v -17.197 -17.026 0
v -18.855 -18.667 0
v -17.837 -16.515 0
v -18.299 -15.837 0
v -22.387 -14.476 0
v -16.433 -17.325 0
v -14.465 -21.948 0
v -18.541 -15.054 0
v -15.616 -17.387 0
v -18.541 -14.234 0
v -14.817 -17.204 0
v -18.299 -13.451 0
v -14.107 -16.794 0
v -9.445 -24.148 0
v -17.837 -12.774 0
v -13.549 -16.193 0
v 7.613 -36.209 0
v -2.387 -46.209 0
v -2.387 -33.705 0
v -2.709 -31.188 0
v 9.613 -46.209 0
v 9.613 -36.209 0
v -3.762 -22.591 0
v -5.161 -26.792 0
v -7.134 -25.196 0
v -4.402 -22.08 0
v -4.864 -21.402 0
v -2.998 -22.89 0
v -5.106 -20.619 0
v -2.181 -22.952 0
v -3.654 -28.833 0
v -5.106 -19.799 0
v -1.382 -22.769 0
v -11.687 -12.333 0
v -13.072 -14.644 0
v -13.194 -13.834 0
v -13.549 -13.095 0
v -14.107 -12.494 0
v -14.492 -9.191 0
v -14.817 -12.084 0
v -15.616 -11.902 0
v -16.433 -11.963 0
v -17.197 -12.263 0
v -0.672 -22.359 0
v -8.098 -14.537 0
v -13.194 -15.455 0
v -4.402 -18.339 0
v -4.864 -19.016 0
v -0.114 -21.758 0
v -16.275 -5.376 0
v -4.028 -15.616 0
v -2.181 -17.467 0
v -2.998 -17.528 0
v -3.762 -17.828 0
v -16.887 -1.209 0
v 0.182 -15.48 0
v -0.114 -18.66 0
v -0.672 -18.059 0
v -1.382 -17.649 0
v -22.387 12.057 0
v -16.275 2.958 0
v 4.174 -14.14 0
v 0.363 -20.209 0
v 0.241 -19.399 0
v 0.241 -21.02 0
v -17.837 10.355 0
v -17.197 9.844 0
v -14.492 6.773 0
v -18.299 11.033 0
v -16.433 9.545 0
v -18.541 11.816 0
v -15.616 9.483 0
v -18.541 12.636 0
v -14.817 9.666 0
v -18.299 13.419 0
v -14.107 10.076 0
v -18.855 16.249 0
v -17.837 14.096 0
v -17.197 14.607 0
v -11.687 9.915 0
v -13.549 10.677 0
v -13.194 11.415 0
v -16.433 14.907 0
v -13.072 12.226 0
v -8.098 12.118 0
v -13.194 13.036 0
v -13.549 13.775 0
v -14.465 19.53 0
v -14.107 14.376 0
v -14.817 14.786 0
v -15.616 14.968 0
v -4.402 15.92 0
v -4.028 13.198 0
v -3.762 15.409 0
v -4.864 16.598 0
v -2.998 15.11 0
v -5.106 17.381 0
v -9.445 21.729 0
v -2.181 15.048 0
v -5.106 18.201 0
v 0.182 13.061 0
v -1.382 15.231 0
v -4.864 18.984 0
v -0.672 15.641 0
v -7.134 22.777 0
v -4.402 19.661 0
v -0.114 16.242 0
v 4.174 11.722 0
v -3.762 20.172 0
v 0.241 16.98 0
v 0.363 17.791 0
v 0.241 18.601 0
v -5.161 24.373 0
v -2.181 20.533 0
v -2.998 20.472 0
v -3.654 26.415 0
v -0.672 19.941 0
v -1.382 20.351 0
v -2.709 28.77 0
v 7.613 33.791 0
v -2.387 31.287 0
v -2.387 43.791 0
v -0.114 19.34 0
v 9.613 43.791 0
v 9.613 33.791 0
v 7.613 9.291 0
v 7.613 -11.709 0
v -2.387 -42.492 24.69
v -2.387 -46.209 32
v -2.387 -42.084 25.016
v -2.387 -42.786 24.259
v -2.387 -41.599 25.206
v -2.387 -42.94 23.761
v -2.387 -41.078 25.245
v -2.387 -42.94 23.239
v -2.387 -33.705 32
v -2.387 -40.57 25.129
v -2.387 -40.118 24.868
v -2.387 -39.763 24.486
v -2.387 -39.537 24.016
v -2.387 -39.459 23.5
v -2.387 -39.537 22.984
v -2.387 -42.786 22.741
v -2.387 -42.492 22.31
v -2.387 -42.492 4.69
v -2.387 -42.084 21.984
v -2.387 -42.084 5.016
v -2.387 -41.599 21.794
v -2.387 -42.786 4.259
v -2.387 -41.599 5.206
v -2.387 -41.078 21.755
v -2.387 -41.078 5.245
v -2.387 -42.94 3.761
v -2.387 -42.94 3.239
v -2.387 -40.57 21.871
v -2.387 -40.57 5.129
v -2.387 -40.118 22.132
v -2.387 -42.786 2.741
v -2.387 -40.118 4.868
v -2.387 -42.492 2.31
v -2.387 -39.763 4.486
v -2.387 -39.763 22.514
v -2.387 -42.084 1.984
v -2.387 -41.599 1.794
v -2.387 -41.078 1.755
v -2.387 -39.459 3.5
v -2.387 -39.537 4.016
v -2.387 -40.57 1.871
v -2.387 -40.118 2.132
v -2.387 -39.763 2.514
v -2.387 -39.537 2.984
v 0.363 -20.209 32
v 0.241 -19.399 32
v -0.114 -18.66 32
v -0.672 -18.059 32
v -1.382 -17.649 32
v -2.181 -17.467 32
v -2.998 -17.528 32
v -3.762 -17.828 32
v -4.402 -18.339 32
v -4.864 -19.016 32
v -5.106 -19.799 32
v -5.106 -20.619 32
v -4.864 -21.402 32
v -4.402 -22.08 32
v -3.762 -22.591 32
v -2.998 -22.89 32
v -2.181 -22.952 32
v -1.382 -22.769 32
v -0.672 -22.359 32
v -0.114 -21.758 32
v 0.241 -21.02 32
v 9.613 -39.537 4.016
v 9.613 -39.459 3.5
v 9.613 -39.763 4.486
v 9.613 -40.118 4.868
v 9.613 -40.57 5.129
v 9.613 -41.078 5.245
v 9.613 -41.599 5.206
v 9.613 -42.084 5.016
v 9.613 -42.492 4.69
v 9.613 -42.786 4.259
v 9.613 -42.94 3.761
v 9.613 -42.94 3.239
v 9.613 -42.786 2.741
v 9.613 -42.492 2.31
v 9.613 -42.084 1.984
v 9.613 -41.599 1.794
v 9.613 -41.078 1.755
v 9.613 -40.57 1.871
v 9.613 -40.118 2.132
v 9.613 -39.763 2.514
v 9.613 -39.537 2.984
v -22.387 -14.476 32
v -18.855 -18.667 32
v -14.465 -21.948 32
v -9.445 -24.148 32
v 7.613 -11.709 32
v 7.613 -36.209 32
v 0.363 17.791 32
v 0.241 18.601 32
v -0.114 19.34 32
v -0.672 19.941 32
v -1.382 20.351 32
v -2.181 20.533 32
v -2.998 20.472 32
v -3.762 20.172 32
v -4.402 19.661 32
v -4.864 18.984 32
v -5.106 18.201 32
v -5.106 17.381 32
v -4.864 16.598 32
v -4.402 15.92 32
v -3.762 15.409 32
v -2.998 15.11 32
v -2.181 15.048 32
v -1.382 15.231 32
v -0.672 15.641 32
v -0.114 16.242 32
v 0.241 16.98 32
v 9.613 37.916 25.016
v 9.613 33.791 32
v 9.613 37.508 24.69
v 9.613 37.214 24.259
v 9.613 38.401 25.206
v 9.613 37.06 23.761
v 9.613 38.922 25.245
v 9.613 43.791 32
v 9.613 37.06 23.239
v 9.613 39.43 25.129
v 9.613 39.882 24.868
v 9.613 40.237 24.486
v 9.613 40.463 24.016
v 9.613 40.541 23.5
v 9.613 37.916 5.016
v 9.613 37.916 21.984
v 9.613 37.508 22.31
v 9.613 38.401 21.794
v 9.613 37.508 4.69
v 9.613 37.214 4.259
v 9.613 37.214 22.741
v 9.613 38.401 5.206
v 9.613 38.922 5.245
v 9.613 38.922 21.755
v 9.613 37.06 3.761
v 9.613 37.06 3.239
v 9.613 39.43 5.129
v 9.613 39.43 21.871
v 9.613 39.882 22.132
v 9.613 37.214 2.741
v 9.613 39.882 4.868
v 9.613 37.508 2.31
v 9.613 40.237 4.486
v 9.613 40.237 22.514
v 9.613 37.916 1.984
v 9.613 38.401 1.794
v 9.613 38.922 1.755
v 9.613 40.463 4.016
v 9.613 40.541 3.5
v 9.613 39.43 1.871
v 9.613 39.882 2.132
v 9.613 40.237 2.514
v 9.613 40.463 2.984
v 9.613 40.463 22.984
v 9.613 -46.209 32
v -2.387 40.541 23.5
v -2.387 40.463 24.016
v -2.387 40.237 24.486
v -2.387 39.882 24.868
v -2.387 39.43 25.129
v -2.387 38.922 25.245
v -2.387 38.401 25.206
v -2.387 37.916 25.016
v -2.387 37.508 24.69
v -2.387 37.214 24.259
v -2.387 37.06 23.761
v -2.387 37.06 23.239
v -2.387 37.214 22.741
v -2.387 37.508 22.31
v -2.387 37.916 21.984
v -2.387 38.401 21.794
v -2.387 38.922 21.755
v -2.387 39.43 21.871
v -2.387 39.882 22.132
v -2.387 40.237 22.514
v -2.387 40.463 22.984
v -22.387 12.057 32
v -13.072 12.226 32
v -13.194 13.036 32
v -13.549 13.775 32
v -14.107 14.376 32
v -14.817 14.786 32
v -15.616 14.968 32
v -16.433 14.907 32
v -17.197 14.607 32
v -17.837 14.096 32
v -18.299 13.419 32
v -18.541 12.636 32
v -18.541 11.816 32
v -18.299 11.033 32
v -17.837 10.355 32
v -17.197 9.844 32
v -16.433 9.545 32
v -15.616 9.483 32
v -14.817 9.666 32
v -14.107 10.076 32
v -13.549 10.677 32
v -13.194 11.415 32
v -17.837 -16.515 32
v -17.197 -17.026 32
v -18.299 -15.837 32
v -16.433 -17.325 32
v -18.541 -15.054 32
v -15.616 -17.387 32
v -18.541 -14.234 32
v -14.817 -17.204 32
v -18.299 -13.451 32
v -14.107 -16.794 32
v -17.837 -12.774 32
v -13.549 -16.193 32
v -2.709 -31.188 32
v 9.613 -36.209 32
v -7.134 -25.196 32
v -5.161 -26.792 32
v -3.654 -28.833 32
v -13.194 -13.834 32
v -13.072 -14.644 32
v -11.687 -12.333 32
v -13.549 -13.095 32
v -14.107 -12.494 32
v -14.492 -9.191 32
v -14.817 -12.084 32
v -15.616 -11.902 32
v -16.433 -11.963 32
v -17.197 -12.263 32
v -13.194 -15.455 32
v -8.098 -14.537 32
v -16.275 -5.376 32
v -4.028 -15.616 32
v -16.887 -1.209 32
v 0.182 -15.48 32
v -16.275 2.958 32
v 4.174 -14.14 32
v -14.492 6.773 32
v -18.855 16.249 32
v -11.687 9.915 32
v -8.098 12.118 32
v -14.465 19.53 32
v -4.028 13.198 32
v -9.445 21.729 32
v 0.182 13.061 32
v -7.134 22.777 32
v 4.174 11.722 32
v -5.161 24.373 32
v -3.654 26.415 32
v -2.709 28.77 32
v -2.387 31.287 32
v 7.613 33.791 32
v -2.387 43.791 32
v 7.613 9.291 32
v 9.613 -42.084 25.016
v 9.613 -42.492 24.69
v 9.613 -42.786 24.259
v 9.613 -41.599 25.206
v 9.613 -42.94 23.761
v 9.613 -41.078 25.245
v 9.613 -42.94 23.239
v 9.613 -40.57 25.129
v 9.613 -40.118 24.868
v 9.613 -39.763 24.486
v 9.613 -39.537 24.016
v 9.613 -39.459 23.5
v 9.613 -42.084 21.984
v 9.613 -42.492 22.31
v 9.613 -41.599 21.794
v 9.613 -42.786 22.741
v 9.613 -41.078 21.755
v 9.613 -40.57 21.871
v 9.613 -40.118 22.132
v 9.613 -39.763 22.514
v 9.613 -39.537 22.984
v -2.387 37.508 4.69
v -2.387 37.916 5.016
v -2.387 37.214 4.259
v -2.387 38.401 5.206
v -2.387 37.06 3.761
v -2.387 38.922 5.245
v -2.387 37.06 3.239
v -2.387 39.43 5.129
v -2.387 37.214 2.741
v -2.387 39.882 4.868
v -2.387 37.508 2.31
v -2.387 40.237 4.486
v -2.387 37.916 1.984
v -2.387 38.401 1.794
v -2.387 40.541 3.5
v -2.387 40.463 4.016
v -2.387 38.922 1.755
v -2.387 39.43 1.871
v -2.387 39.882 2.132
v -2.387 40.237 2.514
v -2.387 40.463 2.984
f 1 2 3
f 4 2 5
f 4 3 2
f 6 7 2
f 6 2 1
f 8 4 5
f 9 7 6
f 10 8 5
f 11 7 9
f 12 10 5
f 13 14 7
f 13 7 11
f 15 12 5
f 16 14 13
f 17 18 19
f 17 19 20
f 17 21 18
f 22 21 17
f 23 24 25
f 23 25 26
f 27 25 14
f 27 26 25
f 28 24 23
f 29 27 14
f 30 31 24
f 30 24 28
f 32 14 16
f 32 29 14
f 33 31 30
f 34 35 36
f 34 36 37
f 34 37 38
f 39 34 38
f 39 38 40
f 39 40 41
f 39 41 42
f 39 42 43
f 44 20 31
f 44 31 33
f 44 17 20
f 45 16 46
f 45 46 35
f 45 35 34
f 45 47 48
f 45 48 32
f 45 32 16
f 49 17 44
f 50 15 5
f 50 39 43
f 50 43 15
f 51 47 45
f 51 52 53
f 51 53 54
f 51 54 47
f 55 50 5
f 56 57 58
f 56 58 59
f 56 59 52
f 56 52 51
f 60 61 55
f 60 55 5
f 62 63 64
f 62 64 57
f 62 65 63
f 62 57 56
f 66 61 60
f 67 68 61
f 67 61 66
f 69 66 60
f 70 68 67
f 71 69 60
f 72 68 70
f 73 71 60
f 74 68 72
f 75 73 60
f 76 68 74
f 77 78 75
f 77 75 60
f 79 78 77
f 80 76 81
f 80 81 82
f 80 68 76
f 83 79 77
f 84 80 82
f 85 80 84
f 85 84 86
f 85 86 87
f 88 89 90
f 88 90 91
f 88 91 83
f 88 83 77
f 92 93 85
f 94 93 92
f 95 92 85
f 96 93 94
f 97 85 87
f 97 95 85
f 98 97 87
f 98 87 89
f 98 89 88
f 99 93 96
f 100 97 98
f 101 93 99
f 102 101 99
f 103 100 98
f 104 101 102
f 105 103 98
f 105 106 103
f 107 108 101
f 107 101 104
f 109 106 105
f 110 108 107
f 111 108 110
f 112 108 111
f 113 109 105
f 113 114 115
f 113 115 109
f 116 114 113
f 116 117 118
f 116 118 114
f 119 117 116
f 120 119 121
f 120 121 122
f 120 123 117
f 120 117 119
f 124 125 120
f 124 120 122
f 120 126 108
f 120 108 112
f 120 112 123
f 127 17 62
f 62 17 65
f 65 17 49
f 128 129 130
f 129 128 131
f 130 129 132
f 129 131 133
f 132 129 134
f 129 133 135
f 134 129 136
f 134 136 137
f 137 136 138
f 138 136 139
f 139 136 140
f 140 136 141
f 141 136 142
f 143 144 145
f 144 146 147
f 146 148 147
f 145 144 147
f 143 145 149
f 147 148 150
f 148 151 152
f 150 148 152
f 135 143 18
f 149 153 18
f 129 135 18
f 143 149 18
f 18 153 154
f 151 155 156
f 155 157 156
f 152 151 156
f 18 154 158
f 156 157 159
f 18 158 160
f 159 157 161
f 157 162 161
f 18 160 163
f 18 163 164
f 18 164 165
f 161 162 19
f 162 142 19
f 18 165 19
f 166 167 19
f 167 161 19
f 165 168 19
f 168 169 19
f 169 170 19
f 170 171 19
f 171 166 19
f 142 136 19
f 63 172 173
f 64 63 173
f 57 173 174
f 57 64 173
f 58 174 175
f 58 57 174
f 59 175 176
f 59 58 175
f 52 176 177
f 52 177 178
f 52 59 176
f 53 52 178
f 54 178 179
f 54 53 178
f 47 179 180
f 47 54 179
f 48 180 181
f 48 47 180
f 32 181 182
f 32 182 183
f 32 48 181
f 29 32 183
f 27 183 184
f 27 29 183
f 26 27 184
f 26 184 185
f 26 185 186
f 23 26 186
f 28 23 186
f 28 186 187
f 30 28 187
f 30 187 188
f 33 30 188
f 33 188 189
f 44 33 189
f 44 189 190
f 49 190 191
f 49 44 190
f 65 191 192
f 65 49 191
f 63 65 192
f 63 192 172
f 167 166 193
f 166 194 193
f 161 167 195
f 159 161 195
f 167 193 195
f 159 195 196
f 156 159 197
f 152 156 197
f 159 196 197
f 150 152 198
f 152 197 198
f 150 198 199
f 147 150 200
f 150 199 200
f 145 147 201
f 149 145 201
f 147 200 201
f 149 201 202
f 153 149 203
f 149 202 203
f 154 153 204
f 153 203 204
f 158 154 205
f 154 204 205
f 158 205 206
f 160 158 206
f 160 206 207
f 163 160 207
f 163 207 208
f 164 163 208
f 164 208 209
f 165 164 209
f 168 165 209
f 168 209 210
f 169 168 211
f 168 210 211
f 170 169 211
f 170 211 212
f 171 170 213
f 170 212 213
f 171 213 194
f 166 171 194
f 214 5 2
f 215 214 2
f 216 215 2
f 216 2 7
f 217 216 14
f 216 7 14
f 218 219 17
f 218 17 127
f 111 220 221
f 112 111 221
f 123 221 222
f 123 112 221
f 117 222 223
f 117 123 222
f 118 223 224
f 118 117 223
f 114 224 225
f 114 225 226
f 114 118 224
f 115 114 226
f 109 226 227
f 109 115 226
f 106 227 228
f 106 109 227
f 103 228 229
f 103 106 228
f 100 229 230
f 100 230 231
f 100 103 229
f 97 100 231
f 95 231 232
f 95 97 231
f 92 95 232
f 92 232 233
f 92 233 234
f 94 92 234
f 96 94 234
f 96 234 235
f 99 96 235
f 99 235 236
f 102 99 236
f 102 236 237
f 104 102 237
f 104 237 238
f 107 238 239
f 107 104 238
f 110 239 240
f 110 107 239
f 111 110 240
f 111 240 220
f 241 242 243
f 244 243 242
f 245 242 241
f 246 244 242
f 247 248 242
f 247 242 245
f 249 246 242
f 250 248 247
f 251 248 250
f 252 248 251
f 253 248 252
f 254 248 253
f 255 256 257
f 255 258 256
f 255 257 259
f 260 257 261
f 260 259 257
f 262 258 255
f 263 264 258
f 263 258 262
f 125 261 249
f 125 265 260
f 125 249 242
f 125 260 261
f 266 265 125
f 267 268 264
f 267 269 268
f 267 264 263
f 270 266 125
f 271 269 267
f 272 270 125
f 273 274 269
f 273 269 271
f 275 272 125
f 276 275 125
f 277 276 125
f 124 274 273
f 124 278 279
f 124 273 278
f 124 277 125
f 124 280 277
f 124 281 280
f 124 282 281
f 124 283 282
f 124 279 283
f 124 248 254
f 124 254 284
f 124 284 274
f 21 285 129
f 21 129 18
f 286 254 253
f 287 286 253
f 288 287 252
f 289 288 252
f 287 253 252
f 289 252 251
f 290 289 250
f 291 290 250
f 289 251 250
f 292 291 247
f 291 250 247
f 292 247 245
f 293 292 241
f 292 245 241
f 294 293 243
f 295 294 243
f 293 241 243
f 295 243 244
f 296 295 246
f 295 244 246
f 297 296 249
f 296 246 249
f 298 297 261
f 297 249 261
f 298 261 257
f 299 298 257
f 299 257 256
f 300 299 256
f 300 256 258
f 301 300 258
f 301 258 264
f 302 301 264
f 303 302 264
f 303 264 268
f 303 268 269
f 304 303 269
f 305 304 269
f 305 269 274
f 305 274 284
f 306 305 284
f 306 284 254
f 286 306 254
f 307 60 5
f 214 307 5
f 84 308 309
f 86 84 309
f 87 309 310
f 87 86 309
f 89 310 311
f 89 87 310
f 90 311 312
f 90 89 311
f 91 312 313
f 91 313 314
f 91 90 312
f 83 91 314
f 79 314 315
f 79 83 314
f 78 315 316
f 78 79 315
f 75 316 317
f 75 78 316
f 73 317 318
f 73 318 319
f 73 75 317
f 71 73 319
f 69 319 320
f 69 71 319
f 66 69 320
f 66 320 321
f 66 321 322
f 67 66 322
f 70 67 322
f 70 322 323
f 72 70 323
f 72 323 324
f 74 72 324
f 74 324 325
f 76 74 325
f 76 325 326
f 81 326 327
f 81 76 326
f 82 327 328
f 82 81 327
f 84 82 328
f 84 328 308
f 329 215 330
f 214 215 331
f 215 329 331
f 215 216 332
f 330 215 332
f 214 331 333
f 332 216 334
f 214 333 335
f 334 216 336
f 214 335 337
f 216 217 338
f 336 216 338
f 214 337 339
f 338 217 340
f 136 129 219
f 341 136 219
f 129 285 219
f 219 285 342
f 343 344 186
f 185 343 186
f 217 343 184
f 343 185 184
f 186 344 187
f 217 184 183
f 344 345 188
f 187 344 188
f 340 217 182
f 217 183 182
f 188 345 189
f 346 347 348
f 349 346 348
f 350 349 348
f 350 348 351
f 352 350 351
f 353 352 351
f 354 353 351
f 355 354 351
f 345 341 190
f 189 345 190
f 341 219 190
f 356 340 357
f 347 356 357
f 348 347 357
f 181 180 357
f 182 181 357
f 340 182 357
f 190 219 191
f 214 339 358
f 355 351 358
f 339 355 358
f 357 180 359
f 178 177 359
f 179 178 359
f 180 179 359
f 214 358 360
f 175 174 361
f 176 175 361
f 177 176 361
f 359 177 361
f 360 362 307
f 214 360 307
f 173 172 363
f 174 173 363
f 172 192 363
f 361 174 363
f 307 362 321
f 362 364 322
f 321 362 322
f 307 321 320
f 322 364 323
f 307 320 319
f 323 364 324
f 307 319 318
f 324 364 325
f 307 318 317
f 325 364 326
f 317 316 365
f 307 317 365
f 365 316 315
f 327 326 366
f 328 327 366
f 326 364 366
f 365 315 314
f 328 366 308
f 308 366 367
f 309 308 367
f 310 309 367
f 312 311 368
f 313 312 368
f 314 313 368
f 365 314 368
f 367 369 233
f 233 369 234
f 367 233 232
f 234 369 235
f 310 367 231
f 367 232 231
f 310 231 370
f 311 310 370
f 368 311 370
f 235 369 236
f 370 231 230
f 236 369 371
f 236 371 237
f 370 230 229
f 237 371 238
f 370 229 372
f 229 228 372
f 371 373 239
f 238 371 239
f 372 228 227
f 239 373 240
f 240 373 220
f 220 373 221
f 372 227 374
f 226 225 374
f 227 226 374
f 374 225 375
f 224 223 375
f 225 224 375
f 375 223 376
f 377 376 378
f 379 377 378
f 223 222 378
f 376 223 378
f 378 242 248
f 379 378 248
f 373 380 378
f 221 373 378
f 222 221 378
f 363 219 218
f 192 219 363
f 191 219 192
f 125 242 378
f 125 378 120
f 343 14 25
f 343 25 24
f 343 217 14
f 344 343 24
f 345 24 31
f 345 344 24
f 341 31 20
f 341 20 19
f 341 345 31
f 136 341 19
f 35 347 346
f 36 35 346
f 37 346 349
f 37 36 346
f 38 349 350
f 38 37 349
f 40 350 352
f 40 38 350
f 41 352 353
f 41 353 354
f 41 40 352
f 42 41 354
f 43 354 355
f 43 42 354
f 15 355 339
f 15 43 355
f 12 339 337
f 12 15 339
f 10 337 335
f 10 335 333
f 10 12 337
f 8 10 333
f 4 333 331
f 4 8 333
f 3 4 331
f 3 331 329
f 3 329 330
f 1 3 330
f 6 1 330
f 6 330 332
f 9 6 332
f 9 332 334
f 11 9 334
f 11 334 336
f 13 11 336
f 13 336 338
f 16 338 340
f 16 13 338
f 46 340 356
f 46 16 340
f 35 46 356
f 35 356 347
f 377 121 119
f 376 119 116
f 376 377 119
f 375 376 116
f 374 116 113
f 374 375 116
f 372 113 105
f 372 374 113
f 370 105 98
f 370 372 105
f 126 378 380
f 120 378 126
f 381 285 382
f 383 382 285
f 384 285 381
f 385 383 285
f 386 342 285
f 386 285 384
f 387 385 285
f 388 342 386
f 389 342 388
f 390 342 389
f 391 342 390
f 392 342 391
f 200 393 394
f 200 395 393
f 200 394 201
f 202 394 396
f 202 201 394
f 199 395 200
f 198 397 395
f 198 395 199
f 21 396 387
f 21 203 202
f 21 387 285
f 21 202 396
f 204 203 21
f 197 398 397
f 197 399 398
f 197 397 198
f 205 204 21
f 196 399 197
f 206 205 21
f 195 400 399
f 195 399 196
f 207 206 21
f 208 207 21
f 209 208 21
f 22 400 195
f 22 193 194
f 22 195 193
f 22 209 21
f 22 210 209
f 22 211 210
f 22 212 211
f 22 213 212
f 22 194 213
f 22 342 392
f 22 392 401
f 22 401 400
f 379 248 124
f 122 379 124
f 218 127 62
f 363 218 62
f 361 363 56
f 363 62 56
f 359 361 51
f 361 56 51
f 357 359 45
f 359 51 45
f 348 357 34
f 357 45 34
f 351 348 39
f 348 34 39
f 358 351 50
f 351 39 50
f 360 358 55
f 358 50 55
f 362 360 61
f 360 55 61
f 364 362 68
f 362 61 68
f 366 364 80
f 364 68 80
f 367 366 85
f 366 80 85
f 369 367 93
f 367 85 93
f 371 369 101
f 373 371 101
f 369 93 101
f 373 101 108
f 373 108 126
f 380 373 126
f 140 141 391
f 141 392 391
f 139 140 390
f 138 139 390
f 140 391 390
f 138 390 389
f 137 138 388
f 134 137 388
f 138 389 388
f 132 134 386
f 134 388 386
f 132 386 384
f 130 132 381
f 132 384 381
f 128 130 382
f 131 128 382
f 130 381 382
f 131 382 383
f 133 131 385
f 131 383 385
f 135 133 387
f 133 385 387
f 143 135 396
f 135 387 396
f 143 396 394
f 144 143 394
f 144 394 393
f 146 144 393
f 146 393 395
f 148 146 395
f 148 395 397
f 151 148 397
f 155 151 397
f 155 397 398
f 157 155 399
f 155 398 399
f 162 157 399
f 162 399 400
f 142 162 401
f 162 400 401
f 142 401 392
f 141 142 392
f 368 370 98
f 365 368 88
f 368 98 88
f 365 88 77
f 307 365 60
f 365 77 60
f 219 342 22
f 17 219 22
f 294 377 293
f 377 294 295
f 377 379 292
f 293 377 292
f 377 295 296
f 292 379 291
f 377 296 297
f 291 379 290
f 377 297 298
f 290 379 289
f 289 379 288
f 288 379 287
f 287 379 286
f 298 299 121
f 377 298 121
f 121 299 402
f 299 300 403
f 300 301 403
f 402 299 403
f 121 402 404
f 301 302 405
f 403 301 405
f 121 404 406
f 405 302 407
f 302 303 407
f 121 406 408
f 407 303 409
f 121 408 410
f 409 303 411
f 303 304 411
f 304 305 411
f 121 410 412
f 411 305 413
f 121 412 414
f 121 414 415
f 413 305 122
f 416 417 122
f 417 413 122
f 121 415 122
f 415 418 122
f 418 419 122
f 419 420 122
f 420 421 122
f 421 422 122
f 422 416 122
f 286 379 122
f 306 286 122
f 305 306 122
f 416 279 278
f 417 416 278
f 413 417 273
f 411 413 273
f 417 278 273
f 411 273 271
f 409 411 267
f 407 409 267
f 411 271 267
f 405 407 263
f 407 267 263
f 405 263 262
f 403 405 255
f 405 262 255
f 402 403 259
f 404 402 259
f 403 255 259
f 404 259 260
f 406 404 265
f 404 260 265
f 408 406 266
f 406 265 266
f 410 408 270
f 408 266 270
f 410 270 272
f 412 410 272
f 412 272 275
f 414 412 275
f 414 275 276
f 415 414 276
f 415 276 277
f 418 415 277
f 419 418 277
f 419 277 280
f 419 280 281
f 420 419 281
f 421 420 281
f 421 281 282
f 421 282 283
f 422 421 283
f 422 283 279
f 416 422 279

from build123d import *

# Parameters (mm, degrees)
ESQUISSE2_R        = 2.75
BOSS_EXTRU_1_DEPTH = 32
ESQUISSE3_W        = 32
ESQUISSE3_H        = 21
ESQUISSE3_R        = 1.75
BOSS_EXTRU_2_DEPTH = 10
BOSS_EXTRU_3_START = 2
ESQUISSE4_W        = 32
ESQUISSE4_H        = 10
ESQUISSE4_R        = 1.75
BOSS_EXTRU_3_DEPTH = 2
CONG_1_R           = 10


with BuildPart() as part:
    # Esquisse2 → Boss.-Extru.1 (new body)
    with BuildSketch(Plane.XY):
        with BuildLine():
            Line((-22.386521132, 12.057241029), (-22.386521132, -14.475757294))
            ThreePointArc((-22.386521132, -14.475757294), (-13.735618456, -22.356314427), (-2.386521132, -25.209258133))
            Line((-2.386521132, -25.209258133), (7.613478868, -25.209258133))
            Line((7.613478868, -25.209258133), (7.613478868, -11.709258133))
            ThreePointArc((7.613478868, -11.709258133), (-16.886521132, -1.209258133), (7.613478868, 9.290741867))
            Line((7.613478868, 9.290741867), (7.613478868, 22.790741867))
            Line((7.613478868, 22.790741867), (-2.386521132, 22.790741867))
            ThreePointArc((-2.386521132, 22.790741867), (-13.735618456, 19.937798162), (-22.386521132, 12.057241029))
        make_face()
        with Locations((-2.386521132, 17.790741867)):
            Circle(ESQUISSE2_R, mode=Mode.SUBTRACT)
        with Locations((-15.821549975, 12.22577071)):
            Circle(ESQUISSE2_R, mode=Mode.SUBTRACT)
        with Locations((-2.386521132, -20.209258133)):
            Circle(ESQUISSE2_R, mode=Mode.SUBTRACT)
        with Locations((-15.821549975, -14.644286975)):
            Circle(ESQUISSE2_R, mode=Mode.SUBTRACT)
    extrude(amount=BOSS_EXTRU_1_DEPTH)

    # Esquisse3 → Boss.-Extru.2 (add)
    # profile 1 of 2: a face of its own
    with BuildSketch(Plane(origin=(7.613478868, 0, 0), x_dir=(0, 0, -1), z_dir=(1, 0, 0))):
        with Locations((-16, 33.290741867)):
            Rectangle(ESQUISSE3_W, ESQUISSE3_H)
        with Locations(Location((-23.5, 38.790741867, 0), (0, 0, 90))):
            Circle(ESQUISSE3_R, mode=Mode.SUBTRACT)
        with Locations(Location((-3.5, 38.790741867, 0), (0, 0, 90))):
            Circle(ESQUISSE3_R, mode=Mode.SUBTRACT)
    # profile 2 of 2: a face of its own
    with BuildSketch(Plane(origin=(7.613478868, 0, 0), x_dir=(0, 0, -1), z_dir=(1, 0, 0))):
        with Locations((-16, -35.709258133)):
            Rectangle(ESQUISSE3_W, ESQUISSE3_H)
        with Locations(Location((-23.5, -41.209258133, 0), (0, 0, 90))):
            Circle(ESQUISSE3_R, mode=Mode.SUBTRACT)
        with Locations(Location((-3.5, -41.209258133, 0), (0, 0, 90))):
            Circle(ESQUISSE3_R, mode=Mode.SUBTRACT)
    extrude(amount=-BOSS_EXTRU_2_DEPTH)

    # Esquisse4 → Boss.-Extru.3 (add)
    # profile 1 of 2: a face of its own
    with BuildSketch(Plane(origin=(7.613478868, 0, 0), x_dir=(0, 0, -1), z_dir=(1, 0, 0)).offset(BOSS_EXTRU_3_START)):
        with Locations((-16, 38.790741867)):
            Rectangle(ESQUISSE4_W, ESQUISSE4_H)
        with Locations(Location((-3.5, 38.790741867, 0), (0, 0, 90))):
            Circle(ESQUISSE4_R, mode=Mode.SUBTRACT)
        with Locations(Location((-23.5, 38.790741867, 0), (0, 0, 90))):
            Circle(ESQUISSE4_R, mode=Mode.SUBTRACT)
    # profile 2 of 2: a face of its own
    with BuildSketch(Plane(origin=(7.613478868, 0, 0), x_dir=(0, 0, -1), z_dir=(1, 0, 0)).offset(BOSS_EXTRU_3_START)):
        with Locations((-16, -41.209258133)):
            Rectangle(ESQUISSE4_W, ESQUISSE4_H)
        with Locations(Location((-3.5, -41.209258133, 0), (0, 0, 90))):
            Circle(ESQUISSE4_R, mode=Mode.SUBTRACT)
        with Locations(Location((-23.5, -41.209258133, 0), (0, 0, 90))):
            Circle(ESQUISSE4_R, mode=Mode.SUBTRACT)
    extrude(amount=-BOSS_EXTRU_3_DEPTH)

    # Congé1
    cong_1_edges = [part.edges().sort_by_distance(p)[0] for p in [
        (-2.386521132, 22.790741867, 16),
        (-2.386521132, -25.209258133, 16),
    ]]
    fillet(cong_1_edges, radius=CONG_1_R)


solid = part.part
